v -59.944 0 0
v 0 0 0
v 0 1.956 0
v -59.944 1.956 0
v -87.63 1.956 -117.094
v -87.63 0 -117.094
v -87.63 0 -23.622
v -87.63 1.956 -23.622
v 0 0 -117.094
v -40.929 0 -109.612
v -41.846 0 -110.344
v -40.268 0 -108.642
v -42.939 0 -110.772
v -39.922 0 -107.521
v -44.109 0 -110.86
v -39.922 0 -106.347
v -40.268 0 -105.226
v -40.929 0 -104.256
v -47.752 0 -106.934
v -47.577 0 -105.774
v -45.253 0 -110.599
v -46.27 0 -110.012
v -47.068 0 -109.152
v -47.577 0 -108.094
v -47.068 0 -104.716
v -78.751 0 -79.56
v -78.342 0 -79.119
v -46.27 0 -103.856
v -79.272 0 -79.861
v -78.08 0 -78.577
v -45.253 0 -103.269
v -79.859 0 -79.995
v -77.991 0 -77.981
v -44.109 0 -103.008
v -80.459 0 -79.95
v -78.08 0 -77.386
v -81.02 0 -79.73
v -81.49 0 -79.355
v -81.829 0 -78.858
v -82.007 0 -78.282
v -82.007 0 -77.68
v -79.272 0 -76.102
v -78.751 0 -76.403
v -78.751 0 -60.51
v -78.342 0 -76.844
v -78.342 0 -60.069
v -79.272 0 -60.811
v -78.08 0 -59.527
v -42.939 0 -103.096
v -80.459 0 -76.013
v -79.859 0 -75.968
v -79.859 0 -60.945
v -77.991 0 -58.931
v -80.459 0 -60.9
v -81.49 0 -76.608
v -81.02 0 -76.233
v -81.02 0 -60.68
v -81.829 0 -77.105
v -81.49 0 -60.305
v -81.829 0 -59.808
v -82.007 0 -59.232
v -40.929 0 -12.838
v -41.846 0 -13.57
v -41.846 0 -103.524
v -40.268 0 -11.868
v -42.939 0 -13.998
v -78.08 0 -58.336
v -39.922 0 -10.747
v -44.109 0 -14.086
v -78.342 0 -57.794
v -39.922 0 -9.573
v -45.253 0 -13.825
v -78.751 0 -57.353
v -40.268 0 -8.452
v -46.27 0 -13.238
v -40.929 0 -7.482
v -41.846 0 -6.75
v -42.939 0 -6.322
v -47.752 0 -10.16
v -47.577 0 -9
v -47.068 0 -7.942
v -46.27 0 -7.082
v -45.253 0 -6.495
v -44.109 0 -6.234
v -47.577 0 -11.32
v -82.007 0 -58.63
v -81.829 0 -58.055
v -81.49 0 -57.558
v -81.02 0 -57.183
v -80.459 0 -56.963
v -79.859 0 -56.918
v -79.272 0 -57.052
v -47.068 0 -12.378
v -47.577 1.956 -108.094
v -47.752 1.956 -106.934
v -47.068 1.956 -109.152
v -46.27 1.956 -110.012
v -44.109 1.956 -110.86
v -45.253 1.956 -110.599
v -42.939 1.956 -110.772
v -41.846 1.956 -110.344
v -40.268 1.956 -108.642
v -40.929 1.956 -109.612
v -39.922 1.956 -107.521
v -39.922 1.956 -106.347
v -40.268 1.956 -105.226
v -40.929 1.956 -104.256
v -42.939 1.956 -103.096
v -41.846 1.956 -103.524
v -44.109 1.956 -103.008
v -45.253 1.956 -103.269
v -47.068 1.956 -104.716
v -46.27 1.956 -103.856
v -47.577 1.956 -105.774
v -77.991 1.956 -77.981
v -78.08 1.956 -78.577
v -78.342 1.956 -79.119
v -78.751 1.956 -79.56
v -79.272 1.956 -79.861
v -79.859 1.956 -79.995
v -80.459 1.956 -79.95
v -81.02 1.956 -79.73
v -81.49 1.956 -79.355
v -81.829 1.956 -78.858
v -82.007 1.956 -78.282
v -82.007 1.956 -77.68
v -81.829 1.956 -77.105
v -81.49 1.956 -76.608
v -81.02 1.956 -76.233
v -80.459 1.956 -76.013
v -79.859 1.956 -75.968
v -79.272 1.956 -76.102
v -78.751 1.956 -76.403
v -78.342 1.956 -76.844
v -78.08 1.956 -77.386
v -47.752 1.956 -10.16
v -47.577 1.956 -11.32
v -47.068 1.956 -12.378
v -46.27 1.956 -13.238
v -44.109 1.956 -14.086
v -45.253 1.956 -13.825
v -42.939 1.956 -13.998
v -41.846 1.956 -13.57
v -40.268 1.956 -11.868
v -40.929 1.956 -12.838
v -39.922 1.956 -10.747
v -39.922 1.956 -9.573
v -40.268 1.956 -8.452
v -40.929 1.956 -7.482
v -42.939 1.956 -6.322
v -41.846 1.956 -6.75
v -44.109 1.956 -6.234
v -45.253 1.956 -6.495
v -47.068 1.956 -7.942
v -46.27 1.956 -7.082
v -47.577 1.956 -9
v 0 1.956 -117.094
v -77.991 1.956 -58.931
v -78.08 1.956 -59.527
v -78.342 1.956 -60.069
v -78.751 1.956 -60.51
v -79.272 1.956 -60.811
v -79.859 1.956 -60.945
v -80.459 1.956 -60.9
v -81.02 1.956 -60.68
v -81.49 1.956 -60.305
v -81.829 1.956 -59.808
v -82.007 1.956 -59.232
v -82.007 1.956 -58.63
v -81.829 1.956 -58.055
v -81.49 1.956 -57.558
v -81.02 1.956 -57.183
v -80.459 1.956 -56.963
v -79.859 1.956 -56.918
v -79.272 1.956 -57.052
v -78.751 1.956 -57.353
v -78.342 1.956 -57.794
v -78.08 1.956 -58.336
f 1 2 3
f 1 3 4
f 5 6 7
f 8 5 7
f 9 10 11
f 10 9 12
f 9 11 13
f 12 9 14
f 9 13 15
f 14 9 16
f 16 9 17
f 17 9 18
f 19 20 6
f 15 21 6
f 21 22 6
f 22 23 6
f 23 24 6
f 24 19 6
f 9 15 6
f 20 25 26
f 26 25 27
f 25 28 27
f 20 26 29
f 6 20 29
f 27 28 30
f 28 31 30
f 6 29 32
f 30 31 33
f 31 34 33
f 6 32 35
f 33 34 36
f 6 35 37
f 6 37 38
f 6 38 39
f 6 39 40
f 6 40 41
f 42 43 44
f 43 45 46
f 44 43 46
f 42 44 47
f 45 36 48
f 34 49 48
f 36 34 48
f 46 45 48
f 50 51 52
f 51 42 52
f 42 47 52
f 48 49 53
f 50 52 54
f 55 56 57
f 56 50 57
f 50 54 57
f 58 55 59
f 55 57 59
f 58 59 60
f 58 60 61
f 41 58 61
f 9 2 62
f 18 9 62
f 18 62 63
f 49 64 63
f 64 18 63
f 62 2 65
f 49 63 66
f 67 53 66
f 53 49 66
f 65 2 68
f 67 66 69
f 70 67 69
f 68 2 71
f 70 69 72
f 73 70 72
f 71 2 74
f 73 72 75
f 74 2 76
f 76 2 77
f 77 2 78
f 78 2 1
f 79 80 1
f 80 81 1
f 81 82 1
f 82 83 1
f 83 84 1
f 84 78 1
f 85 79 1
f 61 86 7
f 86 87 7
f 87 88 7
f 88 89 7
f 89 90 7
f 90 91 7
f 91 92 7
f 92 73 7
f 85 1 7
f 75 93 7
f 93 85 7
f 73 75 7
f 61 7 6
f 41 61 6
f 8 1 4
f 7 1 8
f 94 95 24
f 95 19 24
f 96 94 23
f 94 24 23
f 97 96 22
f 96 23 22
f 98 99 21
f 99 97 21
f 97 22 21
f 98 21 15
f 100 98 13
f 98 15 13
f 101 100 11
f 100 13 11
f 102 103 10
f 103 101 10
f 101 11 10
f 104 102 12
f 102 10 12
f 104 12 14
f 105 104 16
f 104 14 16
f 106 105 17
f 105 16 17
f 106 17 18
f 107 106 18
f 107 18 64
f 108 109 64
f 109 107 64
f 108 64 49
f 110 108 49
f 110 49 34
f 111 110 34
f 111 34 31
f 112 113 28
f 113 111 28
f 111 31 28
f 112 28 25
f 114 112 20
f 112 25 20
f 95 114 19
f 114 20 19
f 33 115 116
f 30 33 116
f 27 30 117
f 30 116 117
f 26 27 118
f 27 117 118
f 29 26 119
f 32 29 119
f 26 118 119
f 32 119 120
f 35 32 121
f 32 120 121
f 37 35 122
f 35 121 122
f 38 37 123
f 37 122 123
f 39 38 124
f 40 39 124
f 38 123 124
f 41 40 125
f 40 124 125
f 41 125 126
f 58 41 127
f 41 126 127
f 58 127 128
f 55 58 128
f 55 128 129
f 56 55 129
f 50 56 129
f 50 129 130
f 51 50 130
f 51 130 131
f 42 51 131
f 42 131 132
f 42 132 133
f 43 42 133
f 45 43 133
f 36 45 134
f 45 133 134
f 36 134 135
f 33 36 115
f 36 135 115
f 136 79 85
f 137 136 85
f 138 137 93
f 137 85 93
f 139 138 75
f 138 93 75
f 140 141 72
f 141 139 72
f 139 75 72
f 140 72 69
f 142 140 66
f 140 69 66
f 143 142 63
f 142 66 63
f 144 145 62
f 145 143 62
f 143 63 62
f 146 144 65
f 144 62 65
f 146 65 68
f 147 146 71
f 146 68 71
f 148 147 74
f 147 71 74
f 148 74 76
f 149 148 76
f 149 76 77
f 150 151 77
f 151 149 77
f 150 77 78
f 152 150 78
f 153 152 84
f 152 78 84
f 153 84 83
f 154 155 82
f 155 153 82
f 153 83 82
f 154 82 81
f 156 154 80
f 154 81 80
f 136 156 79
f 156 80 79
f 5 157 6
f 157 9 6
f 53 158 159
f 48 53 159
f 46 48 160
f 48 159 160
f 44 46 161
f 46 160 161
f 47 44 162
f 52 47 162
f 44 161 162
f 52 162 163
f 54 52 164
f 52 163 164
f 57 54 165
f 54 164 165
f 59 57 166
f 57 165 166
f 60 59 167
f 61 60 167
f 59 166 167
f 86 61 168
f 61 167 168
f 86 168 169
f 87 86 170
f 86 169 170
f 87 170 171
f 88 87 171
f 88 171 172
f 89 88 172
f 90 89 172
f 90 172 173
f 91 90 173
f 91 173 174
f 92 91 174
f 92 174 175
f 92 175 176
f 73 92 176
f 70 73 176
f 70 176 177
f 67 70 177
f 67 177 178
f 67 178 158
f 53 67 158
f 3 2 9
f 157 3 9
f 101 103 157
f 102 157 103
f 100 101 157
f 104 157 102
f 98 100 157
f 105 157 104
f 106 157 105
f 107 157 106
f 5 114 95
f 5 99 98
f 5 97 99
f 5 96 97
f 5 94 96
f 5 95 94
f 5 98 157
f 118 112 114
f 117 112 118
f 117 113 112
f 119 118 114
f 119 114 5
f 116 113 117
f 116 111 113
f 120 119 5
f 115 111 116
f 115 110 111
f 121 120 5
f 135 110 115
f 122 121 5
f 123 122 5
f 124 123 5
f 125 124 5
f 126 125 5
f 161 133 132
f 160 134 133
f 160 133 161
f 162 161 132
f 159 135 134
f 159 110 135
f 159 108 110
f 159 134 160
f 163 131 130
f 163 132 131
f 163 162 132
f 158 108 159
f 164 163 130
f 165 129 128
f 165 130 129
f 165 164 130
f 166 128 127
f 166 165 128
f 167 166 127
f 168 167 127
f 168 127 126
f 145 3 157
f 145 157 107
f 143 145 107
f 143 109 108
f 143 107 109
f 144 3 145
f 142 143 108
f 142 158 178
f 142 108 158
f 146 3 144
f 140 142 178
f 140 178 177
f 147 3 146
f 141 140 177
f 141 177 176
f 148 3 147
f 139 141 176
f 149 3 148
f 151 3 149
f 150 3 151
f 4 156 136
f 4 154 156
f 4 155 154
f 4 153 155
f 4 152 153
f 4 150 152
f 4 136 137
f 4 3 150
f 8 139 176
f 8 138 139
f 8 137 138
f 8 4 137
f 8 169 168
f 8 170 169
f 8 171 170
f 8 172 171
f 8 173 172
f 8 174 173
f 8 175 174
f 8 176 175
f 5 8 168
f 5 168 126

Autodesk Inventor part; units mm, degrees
ref_plane "YZ Plane" through (0, 0, 0) normal (1, 0, 0) x (0, 1, 0)
ref_plane "XZ Plane" through (0, 0, 0) normal (0, 1, 0) x (-1, 0, 0)
ref_plane "XY Plane" through (0, 0, 0) normal (0, 0, 1) x (1, 0, 0)
sketch "Sketch1" plane through (0, 0, 0) normal (0, 1, 0) x (-1, 0, 0)
  line L0 (0, 0) -> (0, -117.094)
  line L1 (0, -117.094) -> (87.63, -117.094)
  line L2 (87.63, -117.094) -> (87.63, -23.622)
  line L3 (0, 0) -> (59.944, 0)
  line L4 (59.944, 0) -> (87.63, -23.622)
  circle A0 centre (43.815, -106.934) radius 3.937
  circle A1 centre (43.815, -10.16) radius 3.937
  line L5 (87.63, -117.094) -> (80.01, -117.094)
  dimension "d0" = 117.094
  dimension "d1" = 87.63
  dimension "d2" = 93.472
  dimension "d3" = 59.944
  dimension "d10" = 7.62
extrude "Extrusion3" add sketch "Sketch1" along normal blind 1.9558
sketch "Sketch2" plane through (0, 1.9558, 0) normal (0, 1, 0) x (1, 0, 0)
  line L0 (0, 117.094) -> (-87.63, 117.094) projected
  line L1 (-87.63, 117.094) -> (-87.63, 86.614)
  line L2 (-87.63, 117.094) -> (-87.63, 23.622) projected
  point P0 (0, 0)
  dimension "d19" = 30.48
sketch "Sketch3" plane through (0, 1.9558, 0) normal (0, 1, 0) x (1, 0, 0)
  line L0 (-83.82, 52.774) -> (-83.82, 84.1388) projected
  line L1 (-76.2, 52.774) -> (-83.82, 52.774) projected
  line L2 (-76.2, 84.1388) -> (-76.2, 52.774) projected
  line L3 (-76.2, 84.1388) -> (-83.82, 84.1388) projected
  circle A0 centre (-80.01, 58.9314) radius 2.0193 projected
  circle A1 centre (-80.01, 77.9814) radius 2.0193 projected
  point P0 (0, 0)
extrude "Extrusion4" cut sketch "Sketch3" against normal blind 25.4 contours A0 | A1
properties part number "Flywheel Motor Plate" material "Steel, Alloy"
